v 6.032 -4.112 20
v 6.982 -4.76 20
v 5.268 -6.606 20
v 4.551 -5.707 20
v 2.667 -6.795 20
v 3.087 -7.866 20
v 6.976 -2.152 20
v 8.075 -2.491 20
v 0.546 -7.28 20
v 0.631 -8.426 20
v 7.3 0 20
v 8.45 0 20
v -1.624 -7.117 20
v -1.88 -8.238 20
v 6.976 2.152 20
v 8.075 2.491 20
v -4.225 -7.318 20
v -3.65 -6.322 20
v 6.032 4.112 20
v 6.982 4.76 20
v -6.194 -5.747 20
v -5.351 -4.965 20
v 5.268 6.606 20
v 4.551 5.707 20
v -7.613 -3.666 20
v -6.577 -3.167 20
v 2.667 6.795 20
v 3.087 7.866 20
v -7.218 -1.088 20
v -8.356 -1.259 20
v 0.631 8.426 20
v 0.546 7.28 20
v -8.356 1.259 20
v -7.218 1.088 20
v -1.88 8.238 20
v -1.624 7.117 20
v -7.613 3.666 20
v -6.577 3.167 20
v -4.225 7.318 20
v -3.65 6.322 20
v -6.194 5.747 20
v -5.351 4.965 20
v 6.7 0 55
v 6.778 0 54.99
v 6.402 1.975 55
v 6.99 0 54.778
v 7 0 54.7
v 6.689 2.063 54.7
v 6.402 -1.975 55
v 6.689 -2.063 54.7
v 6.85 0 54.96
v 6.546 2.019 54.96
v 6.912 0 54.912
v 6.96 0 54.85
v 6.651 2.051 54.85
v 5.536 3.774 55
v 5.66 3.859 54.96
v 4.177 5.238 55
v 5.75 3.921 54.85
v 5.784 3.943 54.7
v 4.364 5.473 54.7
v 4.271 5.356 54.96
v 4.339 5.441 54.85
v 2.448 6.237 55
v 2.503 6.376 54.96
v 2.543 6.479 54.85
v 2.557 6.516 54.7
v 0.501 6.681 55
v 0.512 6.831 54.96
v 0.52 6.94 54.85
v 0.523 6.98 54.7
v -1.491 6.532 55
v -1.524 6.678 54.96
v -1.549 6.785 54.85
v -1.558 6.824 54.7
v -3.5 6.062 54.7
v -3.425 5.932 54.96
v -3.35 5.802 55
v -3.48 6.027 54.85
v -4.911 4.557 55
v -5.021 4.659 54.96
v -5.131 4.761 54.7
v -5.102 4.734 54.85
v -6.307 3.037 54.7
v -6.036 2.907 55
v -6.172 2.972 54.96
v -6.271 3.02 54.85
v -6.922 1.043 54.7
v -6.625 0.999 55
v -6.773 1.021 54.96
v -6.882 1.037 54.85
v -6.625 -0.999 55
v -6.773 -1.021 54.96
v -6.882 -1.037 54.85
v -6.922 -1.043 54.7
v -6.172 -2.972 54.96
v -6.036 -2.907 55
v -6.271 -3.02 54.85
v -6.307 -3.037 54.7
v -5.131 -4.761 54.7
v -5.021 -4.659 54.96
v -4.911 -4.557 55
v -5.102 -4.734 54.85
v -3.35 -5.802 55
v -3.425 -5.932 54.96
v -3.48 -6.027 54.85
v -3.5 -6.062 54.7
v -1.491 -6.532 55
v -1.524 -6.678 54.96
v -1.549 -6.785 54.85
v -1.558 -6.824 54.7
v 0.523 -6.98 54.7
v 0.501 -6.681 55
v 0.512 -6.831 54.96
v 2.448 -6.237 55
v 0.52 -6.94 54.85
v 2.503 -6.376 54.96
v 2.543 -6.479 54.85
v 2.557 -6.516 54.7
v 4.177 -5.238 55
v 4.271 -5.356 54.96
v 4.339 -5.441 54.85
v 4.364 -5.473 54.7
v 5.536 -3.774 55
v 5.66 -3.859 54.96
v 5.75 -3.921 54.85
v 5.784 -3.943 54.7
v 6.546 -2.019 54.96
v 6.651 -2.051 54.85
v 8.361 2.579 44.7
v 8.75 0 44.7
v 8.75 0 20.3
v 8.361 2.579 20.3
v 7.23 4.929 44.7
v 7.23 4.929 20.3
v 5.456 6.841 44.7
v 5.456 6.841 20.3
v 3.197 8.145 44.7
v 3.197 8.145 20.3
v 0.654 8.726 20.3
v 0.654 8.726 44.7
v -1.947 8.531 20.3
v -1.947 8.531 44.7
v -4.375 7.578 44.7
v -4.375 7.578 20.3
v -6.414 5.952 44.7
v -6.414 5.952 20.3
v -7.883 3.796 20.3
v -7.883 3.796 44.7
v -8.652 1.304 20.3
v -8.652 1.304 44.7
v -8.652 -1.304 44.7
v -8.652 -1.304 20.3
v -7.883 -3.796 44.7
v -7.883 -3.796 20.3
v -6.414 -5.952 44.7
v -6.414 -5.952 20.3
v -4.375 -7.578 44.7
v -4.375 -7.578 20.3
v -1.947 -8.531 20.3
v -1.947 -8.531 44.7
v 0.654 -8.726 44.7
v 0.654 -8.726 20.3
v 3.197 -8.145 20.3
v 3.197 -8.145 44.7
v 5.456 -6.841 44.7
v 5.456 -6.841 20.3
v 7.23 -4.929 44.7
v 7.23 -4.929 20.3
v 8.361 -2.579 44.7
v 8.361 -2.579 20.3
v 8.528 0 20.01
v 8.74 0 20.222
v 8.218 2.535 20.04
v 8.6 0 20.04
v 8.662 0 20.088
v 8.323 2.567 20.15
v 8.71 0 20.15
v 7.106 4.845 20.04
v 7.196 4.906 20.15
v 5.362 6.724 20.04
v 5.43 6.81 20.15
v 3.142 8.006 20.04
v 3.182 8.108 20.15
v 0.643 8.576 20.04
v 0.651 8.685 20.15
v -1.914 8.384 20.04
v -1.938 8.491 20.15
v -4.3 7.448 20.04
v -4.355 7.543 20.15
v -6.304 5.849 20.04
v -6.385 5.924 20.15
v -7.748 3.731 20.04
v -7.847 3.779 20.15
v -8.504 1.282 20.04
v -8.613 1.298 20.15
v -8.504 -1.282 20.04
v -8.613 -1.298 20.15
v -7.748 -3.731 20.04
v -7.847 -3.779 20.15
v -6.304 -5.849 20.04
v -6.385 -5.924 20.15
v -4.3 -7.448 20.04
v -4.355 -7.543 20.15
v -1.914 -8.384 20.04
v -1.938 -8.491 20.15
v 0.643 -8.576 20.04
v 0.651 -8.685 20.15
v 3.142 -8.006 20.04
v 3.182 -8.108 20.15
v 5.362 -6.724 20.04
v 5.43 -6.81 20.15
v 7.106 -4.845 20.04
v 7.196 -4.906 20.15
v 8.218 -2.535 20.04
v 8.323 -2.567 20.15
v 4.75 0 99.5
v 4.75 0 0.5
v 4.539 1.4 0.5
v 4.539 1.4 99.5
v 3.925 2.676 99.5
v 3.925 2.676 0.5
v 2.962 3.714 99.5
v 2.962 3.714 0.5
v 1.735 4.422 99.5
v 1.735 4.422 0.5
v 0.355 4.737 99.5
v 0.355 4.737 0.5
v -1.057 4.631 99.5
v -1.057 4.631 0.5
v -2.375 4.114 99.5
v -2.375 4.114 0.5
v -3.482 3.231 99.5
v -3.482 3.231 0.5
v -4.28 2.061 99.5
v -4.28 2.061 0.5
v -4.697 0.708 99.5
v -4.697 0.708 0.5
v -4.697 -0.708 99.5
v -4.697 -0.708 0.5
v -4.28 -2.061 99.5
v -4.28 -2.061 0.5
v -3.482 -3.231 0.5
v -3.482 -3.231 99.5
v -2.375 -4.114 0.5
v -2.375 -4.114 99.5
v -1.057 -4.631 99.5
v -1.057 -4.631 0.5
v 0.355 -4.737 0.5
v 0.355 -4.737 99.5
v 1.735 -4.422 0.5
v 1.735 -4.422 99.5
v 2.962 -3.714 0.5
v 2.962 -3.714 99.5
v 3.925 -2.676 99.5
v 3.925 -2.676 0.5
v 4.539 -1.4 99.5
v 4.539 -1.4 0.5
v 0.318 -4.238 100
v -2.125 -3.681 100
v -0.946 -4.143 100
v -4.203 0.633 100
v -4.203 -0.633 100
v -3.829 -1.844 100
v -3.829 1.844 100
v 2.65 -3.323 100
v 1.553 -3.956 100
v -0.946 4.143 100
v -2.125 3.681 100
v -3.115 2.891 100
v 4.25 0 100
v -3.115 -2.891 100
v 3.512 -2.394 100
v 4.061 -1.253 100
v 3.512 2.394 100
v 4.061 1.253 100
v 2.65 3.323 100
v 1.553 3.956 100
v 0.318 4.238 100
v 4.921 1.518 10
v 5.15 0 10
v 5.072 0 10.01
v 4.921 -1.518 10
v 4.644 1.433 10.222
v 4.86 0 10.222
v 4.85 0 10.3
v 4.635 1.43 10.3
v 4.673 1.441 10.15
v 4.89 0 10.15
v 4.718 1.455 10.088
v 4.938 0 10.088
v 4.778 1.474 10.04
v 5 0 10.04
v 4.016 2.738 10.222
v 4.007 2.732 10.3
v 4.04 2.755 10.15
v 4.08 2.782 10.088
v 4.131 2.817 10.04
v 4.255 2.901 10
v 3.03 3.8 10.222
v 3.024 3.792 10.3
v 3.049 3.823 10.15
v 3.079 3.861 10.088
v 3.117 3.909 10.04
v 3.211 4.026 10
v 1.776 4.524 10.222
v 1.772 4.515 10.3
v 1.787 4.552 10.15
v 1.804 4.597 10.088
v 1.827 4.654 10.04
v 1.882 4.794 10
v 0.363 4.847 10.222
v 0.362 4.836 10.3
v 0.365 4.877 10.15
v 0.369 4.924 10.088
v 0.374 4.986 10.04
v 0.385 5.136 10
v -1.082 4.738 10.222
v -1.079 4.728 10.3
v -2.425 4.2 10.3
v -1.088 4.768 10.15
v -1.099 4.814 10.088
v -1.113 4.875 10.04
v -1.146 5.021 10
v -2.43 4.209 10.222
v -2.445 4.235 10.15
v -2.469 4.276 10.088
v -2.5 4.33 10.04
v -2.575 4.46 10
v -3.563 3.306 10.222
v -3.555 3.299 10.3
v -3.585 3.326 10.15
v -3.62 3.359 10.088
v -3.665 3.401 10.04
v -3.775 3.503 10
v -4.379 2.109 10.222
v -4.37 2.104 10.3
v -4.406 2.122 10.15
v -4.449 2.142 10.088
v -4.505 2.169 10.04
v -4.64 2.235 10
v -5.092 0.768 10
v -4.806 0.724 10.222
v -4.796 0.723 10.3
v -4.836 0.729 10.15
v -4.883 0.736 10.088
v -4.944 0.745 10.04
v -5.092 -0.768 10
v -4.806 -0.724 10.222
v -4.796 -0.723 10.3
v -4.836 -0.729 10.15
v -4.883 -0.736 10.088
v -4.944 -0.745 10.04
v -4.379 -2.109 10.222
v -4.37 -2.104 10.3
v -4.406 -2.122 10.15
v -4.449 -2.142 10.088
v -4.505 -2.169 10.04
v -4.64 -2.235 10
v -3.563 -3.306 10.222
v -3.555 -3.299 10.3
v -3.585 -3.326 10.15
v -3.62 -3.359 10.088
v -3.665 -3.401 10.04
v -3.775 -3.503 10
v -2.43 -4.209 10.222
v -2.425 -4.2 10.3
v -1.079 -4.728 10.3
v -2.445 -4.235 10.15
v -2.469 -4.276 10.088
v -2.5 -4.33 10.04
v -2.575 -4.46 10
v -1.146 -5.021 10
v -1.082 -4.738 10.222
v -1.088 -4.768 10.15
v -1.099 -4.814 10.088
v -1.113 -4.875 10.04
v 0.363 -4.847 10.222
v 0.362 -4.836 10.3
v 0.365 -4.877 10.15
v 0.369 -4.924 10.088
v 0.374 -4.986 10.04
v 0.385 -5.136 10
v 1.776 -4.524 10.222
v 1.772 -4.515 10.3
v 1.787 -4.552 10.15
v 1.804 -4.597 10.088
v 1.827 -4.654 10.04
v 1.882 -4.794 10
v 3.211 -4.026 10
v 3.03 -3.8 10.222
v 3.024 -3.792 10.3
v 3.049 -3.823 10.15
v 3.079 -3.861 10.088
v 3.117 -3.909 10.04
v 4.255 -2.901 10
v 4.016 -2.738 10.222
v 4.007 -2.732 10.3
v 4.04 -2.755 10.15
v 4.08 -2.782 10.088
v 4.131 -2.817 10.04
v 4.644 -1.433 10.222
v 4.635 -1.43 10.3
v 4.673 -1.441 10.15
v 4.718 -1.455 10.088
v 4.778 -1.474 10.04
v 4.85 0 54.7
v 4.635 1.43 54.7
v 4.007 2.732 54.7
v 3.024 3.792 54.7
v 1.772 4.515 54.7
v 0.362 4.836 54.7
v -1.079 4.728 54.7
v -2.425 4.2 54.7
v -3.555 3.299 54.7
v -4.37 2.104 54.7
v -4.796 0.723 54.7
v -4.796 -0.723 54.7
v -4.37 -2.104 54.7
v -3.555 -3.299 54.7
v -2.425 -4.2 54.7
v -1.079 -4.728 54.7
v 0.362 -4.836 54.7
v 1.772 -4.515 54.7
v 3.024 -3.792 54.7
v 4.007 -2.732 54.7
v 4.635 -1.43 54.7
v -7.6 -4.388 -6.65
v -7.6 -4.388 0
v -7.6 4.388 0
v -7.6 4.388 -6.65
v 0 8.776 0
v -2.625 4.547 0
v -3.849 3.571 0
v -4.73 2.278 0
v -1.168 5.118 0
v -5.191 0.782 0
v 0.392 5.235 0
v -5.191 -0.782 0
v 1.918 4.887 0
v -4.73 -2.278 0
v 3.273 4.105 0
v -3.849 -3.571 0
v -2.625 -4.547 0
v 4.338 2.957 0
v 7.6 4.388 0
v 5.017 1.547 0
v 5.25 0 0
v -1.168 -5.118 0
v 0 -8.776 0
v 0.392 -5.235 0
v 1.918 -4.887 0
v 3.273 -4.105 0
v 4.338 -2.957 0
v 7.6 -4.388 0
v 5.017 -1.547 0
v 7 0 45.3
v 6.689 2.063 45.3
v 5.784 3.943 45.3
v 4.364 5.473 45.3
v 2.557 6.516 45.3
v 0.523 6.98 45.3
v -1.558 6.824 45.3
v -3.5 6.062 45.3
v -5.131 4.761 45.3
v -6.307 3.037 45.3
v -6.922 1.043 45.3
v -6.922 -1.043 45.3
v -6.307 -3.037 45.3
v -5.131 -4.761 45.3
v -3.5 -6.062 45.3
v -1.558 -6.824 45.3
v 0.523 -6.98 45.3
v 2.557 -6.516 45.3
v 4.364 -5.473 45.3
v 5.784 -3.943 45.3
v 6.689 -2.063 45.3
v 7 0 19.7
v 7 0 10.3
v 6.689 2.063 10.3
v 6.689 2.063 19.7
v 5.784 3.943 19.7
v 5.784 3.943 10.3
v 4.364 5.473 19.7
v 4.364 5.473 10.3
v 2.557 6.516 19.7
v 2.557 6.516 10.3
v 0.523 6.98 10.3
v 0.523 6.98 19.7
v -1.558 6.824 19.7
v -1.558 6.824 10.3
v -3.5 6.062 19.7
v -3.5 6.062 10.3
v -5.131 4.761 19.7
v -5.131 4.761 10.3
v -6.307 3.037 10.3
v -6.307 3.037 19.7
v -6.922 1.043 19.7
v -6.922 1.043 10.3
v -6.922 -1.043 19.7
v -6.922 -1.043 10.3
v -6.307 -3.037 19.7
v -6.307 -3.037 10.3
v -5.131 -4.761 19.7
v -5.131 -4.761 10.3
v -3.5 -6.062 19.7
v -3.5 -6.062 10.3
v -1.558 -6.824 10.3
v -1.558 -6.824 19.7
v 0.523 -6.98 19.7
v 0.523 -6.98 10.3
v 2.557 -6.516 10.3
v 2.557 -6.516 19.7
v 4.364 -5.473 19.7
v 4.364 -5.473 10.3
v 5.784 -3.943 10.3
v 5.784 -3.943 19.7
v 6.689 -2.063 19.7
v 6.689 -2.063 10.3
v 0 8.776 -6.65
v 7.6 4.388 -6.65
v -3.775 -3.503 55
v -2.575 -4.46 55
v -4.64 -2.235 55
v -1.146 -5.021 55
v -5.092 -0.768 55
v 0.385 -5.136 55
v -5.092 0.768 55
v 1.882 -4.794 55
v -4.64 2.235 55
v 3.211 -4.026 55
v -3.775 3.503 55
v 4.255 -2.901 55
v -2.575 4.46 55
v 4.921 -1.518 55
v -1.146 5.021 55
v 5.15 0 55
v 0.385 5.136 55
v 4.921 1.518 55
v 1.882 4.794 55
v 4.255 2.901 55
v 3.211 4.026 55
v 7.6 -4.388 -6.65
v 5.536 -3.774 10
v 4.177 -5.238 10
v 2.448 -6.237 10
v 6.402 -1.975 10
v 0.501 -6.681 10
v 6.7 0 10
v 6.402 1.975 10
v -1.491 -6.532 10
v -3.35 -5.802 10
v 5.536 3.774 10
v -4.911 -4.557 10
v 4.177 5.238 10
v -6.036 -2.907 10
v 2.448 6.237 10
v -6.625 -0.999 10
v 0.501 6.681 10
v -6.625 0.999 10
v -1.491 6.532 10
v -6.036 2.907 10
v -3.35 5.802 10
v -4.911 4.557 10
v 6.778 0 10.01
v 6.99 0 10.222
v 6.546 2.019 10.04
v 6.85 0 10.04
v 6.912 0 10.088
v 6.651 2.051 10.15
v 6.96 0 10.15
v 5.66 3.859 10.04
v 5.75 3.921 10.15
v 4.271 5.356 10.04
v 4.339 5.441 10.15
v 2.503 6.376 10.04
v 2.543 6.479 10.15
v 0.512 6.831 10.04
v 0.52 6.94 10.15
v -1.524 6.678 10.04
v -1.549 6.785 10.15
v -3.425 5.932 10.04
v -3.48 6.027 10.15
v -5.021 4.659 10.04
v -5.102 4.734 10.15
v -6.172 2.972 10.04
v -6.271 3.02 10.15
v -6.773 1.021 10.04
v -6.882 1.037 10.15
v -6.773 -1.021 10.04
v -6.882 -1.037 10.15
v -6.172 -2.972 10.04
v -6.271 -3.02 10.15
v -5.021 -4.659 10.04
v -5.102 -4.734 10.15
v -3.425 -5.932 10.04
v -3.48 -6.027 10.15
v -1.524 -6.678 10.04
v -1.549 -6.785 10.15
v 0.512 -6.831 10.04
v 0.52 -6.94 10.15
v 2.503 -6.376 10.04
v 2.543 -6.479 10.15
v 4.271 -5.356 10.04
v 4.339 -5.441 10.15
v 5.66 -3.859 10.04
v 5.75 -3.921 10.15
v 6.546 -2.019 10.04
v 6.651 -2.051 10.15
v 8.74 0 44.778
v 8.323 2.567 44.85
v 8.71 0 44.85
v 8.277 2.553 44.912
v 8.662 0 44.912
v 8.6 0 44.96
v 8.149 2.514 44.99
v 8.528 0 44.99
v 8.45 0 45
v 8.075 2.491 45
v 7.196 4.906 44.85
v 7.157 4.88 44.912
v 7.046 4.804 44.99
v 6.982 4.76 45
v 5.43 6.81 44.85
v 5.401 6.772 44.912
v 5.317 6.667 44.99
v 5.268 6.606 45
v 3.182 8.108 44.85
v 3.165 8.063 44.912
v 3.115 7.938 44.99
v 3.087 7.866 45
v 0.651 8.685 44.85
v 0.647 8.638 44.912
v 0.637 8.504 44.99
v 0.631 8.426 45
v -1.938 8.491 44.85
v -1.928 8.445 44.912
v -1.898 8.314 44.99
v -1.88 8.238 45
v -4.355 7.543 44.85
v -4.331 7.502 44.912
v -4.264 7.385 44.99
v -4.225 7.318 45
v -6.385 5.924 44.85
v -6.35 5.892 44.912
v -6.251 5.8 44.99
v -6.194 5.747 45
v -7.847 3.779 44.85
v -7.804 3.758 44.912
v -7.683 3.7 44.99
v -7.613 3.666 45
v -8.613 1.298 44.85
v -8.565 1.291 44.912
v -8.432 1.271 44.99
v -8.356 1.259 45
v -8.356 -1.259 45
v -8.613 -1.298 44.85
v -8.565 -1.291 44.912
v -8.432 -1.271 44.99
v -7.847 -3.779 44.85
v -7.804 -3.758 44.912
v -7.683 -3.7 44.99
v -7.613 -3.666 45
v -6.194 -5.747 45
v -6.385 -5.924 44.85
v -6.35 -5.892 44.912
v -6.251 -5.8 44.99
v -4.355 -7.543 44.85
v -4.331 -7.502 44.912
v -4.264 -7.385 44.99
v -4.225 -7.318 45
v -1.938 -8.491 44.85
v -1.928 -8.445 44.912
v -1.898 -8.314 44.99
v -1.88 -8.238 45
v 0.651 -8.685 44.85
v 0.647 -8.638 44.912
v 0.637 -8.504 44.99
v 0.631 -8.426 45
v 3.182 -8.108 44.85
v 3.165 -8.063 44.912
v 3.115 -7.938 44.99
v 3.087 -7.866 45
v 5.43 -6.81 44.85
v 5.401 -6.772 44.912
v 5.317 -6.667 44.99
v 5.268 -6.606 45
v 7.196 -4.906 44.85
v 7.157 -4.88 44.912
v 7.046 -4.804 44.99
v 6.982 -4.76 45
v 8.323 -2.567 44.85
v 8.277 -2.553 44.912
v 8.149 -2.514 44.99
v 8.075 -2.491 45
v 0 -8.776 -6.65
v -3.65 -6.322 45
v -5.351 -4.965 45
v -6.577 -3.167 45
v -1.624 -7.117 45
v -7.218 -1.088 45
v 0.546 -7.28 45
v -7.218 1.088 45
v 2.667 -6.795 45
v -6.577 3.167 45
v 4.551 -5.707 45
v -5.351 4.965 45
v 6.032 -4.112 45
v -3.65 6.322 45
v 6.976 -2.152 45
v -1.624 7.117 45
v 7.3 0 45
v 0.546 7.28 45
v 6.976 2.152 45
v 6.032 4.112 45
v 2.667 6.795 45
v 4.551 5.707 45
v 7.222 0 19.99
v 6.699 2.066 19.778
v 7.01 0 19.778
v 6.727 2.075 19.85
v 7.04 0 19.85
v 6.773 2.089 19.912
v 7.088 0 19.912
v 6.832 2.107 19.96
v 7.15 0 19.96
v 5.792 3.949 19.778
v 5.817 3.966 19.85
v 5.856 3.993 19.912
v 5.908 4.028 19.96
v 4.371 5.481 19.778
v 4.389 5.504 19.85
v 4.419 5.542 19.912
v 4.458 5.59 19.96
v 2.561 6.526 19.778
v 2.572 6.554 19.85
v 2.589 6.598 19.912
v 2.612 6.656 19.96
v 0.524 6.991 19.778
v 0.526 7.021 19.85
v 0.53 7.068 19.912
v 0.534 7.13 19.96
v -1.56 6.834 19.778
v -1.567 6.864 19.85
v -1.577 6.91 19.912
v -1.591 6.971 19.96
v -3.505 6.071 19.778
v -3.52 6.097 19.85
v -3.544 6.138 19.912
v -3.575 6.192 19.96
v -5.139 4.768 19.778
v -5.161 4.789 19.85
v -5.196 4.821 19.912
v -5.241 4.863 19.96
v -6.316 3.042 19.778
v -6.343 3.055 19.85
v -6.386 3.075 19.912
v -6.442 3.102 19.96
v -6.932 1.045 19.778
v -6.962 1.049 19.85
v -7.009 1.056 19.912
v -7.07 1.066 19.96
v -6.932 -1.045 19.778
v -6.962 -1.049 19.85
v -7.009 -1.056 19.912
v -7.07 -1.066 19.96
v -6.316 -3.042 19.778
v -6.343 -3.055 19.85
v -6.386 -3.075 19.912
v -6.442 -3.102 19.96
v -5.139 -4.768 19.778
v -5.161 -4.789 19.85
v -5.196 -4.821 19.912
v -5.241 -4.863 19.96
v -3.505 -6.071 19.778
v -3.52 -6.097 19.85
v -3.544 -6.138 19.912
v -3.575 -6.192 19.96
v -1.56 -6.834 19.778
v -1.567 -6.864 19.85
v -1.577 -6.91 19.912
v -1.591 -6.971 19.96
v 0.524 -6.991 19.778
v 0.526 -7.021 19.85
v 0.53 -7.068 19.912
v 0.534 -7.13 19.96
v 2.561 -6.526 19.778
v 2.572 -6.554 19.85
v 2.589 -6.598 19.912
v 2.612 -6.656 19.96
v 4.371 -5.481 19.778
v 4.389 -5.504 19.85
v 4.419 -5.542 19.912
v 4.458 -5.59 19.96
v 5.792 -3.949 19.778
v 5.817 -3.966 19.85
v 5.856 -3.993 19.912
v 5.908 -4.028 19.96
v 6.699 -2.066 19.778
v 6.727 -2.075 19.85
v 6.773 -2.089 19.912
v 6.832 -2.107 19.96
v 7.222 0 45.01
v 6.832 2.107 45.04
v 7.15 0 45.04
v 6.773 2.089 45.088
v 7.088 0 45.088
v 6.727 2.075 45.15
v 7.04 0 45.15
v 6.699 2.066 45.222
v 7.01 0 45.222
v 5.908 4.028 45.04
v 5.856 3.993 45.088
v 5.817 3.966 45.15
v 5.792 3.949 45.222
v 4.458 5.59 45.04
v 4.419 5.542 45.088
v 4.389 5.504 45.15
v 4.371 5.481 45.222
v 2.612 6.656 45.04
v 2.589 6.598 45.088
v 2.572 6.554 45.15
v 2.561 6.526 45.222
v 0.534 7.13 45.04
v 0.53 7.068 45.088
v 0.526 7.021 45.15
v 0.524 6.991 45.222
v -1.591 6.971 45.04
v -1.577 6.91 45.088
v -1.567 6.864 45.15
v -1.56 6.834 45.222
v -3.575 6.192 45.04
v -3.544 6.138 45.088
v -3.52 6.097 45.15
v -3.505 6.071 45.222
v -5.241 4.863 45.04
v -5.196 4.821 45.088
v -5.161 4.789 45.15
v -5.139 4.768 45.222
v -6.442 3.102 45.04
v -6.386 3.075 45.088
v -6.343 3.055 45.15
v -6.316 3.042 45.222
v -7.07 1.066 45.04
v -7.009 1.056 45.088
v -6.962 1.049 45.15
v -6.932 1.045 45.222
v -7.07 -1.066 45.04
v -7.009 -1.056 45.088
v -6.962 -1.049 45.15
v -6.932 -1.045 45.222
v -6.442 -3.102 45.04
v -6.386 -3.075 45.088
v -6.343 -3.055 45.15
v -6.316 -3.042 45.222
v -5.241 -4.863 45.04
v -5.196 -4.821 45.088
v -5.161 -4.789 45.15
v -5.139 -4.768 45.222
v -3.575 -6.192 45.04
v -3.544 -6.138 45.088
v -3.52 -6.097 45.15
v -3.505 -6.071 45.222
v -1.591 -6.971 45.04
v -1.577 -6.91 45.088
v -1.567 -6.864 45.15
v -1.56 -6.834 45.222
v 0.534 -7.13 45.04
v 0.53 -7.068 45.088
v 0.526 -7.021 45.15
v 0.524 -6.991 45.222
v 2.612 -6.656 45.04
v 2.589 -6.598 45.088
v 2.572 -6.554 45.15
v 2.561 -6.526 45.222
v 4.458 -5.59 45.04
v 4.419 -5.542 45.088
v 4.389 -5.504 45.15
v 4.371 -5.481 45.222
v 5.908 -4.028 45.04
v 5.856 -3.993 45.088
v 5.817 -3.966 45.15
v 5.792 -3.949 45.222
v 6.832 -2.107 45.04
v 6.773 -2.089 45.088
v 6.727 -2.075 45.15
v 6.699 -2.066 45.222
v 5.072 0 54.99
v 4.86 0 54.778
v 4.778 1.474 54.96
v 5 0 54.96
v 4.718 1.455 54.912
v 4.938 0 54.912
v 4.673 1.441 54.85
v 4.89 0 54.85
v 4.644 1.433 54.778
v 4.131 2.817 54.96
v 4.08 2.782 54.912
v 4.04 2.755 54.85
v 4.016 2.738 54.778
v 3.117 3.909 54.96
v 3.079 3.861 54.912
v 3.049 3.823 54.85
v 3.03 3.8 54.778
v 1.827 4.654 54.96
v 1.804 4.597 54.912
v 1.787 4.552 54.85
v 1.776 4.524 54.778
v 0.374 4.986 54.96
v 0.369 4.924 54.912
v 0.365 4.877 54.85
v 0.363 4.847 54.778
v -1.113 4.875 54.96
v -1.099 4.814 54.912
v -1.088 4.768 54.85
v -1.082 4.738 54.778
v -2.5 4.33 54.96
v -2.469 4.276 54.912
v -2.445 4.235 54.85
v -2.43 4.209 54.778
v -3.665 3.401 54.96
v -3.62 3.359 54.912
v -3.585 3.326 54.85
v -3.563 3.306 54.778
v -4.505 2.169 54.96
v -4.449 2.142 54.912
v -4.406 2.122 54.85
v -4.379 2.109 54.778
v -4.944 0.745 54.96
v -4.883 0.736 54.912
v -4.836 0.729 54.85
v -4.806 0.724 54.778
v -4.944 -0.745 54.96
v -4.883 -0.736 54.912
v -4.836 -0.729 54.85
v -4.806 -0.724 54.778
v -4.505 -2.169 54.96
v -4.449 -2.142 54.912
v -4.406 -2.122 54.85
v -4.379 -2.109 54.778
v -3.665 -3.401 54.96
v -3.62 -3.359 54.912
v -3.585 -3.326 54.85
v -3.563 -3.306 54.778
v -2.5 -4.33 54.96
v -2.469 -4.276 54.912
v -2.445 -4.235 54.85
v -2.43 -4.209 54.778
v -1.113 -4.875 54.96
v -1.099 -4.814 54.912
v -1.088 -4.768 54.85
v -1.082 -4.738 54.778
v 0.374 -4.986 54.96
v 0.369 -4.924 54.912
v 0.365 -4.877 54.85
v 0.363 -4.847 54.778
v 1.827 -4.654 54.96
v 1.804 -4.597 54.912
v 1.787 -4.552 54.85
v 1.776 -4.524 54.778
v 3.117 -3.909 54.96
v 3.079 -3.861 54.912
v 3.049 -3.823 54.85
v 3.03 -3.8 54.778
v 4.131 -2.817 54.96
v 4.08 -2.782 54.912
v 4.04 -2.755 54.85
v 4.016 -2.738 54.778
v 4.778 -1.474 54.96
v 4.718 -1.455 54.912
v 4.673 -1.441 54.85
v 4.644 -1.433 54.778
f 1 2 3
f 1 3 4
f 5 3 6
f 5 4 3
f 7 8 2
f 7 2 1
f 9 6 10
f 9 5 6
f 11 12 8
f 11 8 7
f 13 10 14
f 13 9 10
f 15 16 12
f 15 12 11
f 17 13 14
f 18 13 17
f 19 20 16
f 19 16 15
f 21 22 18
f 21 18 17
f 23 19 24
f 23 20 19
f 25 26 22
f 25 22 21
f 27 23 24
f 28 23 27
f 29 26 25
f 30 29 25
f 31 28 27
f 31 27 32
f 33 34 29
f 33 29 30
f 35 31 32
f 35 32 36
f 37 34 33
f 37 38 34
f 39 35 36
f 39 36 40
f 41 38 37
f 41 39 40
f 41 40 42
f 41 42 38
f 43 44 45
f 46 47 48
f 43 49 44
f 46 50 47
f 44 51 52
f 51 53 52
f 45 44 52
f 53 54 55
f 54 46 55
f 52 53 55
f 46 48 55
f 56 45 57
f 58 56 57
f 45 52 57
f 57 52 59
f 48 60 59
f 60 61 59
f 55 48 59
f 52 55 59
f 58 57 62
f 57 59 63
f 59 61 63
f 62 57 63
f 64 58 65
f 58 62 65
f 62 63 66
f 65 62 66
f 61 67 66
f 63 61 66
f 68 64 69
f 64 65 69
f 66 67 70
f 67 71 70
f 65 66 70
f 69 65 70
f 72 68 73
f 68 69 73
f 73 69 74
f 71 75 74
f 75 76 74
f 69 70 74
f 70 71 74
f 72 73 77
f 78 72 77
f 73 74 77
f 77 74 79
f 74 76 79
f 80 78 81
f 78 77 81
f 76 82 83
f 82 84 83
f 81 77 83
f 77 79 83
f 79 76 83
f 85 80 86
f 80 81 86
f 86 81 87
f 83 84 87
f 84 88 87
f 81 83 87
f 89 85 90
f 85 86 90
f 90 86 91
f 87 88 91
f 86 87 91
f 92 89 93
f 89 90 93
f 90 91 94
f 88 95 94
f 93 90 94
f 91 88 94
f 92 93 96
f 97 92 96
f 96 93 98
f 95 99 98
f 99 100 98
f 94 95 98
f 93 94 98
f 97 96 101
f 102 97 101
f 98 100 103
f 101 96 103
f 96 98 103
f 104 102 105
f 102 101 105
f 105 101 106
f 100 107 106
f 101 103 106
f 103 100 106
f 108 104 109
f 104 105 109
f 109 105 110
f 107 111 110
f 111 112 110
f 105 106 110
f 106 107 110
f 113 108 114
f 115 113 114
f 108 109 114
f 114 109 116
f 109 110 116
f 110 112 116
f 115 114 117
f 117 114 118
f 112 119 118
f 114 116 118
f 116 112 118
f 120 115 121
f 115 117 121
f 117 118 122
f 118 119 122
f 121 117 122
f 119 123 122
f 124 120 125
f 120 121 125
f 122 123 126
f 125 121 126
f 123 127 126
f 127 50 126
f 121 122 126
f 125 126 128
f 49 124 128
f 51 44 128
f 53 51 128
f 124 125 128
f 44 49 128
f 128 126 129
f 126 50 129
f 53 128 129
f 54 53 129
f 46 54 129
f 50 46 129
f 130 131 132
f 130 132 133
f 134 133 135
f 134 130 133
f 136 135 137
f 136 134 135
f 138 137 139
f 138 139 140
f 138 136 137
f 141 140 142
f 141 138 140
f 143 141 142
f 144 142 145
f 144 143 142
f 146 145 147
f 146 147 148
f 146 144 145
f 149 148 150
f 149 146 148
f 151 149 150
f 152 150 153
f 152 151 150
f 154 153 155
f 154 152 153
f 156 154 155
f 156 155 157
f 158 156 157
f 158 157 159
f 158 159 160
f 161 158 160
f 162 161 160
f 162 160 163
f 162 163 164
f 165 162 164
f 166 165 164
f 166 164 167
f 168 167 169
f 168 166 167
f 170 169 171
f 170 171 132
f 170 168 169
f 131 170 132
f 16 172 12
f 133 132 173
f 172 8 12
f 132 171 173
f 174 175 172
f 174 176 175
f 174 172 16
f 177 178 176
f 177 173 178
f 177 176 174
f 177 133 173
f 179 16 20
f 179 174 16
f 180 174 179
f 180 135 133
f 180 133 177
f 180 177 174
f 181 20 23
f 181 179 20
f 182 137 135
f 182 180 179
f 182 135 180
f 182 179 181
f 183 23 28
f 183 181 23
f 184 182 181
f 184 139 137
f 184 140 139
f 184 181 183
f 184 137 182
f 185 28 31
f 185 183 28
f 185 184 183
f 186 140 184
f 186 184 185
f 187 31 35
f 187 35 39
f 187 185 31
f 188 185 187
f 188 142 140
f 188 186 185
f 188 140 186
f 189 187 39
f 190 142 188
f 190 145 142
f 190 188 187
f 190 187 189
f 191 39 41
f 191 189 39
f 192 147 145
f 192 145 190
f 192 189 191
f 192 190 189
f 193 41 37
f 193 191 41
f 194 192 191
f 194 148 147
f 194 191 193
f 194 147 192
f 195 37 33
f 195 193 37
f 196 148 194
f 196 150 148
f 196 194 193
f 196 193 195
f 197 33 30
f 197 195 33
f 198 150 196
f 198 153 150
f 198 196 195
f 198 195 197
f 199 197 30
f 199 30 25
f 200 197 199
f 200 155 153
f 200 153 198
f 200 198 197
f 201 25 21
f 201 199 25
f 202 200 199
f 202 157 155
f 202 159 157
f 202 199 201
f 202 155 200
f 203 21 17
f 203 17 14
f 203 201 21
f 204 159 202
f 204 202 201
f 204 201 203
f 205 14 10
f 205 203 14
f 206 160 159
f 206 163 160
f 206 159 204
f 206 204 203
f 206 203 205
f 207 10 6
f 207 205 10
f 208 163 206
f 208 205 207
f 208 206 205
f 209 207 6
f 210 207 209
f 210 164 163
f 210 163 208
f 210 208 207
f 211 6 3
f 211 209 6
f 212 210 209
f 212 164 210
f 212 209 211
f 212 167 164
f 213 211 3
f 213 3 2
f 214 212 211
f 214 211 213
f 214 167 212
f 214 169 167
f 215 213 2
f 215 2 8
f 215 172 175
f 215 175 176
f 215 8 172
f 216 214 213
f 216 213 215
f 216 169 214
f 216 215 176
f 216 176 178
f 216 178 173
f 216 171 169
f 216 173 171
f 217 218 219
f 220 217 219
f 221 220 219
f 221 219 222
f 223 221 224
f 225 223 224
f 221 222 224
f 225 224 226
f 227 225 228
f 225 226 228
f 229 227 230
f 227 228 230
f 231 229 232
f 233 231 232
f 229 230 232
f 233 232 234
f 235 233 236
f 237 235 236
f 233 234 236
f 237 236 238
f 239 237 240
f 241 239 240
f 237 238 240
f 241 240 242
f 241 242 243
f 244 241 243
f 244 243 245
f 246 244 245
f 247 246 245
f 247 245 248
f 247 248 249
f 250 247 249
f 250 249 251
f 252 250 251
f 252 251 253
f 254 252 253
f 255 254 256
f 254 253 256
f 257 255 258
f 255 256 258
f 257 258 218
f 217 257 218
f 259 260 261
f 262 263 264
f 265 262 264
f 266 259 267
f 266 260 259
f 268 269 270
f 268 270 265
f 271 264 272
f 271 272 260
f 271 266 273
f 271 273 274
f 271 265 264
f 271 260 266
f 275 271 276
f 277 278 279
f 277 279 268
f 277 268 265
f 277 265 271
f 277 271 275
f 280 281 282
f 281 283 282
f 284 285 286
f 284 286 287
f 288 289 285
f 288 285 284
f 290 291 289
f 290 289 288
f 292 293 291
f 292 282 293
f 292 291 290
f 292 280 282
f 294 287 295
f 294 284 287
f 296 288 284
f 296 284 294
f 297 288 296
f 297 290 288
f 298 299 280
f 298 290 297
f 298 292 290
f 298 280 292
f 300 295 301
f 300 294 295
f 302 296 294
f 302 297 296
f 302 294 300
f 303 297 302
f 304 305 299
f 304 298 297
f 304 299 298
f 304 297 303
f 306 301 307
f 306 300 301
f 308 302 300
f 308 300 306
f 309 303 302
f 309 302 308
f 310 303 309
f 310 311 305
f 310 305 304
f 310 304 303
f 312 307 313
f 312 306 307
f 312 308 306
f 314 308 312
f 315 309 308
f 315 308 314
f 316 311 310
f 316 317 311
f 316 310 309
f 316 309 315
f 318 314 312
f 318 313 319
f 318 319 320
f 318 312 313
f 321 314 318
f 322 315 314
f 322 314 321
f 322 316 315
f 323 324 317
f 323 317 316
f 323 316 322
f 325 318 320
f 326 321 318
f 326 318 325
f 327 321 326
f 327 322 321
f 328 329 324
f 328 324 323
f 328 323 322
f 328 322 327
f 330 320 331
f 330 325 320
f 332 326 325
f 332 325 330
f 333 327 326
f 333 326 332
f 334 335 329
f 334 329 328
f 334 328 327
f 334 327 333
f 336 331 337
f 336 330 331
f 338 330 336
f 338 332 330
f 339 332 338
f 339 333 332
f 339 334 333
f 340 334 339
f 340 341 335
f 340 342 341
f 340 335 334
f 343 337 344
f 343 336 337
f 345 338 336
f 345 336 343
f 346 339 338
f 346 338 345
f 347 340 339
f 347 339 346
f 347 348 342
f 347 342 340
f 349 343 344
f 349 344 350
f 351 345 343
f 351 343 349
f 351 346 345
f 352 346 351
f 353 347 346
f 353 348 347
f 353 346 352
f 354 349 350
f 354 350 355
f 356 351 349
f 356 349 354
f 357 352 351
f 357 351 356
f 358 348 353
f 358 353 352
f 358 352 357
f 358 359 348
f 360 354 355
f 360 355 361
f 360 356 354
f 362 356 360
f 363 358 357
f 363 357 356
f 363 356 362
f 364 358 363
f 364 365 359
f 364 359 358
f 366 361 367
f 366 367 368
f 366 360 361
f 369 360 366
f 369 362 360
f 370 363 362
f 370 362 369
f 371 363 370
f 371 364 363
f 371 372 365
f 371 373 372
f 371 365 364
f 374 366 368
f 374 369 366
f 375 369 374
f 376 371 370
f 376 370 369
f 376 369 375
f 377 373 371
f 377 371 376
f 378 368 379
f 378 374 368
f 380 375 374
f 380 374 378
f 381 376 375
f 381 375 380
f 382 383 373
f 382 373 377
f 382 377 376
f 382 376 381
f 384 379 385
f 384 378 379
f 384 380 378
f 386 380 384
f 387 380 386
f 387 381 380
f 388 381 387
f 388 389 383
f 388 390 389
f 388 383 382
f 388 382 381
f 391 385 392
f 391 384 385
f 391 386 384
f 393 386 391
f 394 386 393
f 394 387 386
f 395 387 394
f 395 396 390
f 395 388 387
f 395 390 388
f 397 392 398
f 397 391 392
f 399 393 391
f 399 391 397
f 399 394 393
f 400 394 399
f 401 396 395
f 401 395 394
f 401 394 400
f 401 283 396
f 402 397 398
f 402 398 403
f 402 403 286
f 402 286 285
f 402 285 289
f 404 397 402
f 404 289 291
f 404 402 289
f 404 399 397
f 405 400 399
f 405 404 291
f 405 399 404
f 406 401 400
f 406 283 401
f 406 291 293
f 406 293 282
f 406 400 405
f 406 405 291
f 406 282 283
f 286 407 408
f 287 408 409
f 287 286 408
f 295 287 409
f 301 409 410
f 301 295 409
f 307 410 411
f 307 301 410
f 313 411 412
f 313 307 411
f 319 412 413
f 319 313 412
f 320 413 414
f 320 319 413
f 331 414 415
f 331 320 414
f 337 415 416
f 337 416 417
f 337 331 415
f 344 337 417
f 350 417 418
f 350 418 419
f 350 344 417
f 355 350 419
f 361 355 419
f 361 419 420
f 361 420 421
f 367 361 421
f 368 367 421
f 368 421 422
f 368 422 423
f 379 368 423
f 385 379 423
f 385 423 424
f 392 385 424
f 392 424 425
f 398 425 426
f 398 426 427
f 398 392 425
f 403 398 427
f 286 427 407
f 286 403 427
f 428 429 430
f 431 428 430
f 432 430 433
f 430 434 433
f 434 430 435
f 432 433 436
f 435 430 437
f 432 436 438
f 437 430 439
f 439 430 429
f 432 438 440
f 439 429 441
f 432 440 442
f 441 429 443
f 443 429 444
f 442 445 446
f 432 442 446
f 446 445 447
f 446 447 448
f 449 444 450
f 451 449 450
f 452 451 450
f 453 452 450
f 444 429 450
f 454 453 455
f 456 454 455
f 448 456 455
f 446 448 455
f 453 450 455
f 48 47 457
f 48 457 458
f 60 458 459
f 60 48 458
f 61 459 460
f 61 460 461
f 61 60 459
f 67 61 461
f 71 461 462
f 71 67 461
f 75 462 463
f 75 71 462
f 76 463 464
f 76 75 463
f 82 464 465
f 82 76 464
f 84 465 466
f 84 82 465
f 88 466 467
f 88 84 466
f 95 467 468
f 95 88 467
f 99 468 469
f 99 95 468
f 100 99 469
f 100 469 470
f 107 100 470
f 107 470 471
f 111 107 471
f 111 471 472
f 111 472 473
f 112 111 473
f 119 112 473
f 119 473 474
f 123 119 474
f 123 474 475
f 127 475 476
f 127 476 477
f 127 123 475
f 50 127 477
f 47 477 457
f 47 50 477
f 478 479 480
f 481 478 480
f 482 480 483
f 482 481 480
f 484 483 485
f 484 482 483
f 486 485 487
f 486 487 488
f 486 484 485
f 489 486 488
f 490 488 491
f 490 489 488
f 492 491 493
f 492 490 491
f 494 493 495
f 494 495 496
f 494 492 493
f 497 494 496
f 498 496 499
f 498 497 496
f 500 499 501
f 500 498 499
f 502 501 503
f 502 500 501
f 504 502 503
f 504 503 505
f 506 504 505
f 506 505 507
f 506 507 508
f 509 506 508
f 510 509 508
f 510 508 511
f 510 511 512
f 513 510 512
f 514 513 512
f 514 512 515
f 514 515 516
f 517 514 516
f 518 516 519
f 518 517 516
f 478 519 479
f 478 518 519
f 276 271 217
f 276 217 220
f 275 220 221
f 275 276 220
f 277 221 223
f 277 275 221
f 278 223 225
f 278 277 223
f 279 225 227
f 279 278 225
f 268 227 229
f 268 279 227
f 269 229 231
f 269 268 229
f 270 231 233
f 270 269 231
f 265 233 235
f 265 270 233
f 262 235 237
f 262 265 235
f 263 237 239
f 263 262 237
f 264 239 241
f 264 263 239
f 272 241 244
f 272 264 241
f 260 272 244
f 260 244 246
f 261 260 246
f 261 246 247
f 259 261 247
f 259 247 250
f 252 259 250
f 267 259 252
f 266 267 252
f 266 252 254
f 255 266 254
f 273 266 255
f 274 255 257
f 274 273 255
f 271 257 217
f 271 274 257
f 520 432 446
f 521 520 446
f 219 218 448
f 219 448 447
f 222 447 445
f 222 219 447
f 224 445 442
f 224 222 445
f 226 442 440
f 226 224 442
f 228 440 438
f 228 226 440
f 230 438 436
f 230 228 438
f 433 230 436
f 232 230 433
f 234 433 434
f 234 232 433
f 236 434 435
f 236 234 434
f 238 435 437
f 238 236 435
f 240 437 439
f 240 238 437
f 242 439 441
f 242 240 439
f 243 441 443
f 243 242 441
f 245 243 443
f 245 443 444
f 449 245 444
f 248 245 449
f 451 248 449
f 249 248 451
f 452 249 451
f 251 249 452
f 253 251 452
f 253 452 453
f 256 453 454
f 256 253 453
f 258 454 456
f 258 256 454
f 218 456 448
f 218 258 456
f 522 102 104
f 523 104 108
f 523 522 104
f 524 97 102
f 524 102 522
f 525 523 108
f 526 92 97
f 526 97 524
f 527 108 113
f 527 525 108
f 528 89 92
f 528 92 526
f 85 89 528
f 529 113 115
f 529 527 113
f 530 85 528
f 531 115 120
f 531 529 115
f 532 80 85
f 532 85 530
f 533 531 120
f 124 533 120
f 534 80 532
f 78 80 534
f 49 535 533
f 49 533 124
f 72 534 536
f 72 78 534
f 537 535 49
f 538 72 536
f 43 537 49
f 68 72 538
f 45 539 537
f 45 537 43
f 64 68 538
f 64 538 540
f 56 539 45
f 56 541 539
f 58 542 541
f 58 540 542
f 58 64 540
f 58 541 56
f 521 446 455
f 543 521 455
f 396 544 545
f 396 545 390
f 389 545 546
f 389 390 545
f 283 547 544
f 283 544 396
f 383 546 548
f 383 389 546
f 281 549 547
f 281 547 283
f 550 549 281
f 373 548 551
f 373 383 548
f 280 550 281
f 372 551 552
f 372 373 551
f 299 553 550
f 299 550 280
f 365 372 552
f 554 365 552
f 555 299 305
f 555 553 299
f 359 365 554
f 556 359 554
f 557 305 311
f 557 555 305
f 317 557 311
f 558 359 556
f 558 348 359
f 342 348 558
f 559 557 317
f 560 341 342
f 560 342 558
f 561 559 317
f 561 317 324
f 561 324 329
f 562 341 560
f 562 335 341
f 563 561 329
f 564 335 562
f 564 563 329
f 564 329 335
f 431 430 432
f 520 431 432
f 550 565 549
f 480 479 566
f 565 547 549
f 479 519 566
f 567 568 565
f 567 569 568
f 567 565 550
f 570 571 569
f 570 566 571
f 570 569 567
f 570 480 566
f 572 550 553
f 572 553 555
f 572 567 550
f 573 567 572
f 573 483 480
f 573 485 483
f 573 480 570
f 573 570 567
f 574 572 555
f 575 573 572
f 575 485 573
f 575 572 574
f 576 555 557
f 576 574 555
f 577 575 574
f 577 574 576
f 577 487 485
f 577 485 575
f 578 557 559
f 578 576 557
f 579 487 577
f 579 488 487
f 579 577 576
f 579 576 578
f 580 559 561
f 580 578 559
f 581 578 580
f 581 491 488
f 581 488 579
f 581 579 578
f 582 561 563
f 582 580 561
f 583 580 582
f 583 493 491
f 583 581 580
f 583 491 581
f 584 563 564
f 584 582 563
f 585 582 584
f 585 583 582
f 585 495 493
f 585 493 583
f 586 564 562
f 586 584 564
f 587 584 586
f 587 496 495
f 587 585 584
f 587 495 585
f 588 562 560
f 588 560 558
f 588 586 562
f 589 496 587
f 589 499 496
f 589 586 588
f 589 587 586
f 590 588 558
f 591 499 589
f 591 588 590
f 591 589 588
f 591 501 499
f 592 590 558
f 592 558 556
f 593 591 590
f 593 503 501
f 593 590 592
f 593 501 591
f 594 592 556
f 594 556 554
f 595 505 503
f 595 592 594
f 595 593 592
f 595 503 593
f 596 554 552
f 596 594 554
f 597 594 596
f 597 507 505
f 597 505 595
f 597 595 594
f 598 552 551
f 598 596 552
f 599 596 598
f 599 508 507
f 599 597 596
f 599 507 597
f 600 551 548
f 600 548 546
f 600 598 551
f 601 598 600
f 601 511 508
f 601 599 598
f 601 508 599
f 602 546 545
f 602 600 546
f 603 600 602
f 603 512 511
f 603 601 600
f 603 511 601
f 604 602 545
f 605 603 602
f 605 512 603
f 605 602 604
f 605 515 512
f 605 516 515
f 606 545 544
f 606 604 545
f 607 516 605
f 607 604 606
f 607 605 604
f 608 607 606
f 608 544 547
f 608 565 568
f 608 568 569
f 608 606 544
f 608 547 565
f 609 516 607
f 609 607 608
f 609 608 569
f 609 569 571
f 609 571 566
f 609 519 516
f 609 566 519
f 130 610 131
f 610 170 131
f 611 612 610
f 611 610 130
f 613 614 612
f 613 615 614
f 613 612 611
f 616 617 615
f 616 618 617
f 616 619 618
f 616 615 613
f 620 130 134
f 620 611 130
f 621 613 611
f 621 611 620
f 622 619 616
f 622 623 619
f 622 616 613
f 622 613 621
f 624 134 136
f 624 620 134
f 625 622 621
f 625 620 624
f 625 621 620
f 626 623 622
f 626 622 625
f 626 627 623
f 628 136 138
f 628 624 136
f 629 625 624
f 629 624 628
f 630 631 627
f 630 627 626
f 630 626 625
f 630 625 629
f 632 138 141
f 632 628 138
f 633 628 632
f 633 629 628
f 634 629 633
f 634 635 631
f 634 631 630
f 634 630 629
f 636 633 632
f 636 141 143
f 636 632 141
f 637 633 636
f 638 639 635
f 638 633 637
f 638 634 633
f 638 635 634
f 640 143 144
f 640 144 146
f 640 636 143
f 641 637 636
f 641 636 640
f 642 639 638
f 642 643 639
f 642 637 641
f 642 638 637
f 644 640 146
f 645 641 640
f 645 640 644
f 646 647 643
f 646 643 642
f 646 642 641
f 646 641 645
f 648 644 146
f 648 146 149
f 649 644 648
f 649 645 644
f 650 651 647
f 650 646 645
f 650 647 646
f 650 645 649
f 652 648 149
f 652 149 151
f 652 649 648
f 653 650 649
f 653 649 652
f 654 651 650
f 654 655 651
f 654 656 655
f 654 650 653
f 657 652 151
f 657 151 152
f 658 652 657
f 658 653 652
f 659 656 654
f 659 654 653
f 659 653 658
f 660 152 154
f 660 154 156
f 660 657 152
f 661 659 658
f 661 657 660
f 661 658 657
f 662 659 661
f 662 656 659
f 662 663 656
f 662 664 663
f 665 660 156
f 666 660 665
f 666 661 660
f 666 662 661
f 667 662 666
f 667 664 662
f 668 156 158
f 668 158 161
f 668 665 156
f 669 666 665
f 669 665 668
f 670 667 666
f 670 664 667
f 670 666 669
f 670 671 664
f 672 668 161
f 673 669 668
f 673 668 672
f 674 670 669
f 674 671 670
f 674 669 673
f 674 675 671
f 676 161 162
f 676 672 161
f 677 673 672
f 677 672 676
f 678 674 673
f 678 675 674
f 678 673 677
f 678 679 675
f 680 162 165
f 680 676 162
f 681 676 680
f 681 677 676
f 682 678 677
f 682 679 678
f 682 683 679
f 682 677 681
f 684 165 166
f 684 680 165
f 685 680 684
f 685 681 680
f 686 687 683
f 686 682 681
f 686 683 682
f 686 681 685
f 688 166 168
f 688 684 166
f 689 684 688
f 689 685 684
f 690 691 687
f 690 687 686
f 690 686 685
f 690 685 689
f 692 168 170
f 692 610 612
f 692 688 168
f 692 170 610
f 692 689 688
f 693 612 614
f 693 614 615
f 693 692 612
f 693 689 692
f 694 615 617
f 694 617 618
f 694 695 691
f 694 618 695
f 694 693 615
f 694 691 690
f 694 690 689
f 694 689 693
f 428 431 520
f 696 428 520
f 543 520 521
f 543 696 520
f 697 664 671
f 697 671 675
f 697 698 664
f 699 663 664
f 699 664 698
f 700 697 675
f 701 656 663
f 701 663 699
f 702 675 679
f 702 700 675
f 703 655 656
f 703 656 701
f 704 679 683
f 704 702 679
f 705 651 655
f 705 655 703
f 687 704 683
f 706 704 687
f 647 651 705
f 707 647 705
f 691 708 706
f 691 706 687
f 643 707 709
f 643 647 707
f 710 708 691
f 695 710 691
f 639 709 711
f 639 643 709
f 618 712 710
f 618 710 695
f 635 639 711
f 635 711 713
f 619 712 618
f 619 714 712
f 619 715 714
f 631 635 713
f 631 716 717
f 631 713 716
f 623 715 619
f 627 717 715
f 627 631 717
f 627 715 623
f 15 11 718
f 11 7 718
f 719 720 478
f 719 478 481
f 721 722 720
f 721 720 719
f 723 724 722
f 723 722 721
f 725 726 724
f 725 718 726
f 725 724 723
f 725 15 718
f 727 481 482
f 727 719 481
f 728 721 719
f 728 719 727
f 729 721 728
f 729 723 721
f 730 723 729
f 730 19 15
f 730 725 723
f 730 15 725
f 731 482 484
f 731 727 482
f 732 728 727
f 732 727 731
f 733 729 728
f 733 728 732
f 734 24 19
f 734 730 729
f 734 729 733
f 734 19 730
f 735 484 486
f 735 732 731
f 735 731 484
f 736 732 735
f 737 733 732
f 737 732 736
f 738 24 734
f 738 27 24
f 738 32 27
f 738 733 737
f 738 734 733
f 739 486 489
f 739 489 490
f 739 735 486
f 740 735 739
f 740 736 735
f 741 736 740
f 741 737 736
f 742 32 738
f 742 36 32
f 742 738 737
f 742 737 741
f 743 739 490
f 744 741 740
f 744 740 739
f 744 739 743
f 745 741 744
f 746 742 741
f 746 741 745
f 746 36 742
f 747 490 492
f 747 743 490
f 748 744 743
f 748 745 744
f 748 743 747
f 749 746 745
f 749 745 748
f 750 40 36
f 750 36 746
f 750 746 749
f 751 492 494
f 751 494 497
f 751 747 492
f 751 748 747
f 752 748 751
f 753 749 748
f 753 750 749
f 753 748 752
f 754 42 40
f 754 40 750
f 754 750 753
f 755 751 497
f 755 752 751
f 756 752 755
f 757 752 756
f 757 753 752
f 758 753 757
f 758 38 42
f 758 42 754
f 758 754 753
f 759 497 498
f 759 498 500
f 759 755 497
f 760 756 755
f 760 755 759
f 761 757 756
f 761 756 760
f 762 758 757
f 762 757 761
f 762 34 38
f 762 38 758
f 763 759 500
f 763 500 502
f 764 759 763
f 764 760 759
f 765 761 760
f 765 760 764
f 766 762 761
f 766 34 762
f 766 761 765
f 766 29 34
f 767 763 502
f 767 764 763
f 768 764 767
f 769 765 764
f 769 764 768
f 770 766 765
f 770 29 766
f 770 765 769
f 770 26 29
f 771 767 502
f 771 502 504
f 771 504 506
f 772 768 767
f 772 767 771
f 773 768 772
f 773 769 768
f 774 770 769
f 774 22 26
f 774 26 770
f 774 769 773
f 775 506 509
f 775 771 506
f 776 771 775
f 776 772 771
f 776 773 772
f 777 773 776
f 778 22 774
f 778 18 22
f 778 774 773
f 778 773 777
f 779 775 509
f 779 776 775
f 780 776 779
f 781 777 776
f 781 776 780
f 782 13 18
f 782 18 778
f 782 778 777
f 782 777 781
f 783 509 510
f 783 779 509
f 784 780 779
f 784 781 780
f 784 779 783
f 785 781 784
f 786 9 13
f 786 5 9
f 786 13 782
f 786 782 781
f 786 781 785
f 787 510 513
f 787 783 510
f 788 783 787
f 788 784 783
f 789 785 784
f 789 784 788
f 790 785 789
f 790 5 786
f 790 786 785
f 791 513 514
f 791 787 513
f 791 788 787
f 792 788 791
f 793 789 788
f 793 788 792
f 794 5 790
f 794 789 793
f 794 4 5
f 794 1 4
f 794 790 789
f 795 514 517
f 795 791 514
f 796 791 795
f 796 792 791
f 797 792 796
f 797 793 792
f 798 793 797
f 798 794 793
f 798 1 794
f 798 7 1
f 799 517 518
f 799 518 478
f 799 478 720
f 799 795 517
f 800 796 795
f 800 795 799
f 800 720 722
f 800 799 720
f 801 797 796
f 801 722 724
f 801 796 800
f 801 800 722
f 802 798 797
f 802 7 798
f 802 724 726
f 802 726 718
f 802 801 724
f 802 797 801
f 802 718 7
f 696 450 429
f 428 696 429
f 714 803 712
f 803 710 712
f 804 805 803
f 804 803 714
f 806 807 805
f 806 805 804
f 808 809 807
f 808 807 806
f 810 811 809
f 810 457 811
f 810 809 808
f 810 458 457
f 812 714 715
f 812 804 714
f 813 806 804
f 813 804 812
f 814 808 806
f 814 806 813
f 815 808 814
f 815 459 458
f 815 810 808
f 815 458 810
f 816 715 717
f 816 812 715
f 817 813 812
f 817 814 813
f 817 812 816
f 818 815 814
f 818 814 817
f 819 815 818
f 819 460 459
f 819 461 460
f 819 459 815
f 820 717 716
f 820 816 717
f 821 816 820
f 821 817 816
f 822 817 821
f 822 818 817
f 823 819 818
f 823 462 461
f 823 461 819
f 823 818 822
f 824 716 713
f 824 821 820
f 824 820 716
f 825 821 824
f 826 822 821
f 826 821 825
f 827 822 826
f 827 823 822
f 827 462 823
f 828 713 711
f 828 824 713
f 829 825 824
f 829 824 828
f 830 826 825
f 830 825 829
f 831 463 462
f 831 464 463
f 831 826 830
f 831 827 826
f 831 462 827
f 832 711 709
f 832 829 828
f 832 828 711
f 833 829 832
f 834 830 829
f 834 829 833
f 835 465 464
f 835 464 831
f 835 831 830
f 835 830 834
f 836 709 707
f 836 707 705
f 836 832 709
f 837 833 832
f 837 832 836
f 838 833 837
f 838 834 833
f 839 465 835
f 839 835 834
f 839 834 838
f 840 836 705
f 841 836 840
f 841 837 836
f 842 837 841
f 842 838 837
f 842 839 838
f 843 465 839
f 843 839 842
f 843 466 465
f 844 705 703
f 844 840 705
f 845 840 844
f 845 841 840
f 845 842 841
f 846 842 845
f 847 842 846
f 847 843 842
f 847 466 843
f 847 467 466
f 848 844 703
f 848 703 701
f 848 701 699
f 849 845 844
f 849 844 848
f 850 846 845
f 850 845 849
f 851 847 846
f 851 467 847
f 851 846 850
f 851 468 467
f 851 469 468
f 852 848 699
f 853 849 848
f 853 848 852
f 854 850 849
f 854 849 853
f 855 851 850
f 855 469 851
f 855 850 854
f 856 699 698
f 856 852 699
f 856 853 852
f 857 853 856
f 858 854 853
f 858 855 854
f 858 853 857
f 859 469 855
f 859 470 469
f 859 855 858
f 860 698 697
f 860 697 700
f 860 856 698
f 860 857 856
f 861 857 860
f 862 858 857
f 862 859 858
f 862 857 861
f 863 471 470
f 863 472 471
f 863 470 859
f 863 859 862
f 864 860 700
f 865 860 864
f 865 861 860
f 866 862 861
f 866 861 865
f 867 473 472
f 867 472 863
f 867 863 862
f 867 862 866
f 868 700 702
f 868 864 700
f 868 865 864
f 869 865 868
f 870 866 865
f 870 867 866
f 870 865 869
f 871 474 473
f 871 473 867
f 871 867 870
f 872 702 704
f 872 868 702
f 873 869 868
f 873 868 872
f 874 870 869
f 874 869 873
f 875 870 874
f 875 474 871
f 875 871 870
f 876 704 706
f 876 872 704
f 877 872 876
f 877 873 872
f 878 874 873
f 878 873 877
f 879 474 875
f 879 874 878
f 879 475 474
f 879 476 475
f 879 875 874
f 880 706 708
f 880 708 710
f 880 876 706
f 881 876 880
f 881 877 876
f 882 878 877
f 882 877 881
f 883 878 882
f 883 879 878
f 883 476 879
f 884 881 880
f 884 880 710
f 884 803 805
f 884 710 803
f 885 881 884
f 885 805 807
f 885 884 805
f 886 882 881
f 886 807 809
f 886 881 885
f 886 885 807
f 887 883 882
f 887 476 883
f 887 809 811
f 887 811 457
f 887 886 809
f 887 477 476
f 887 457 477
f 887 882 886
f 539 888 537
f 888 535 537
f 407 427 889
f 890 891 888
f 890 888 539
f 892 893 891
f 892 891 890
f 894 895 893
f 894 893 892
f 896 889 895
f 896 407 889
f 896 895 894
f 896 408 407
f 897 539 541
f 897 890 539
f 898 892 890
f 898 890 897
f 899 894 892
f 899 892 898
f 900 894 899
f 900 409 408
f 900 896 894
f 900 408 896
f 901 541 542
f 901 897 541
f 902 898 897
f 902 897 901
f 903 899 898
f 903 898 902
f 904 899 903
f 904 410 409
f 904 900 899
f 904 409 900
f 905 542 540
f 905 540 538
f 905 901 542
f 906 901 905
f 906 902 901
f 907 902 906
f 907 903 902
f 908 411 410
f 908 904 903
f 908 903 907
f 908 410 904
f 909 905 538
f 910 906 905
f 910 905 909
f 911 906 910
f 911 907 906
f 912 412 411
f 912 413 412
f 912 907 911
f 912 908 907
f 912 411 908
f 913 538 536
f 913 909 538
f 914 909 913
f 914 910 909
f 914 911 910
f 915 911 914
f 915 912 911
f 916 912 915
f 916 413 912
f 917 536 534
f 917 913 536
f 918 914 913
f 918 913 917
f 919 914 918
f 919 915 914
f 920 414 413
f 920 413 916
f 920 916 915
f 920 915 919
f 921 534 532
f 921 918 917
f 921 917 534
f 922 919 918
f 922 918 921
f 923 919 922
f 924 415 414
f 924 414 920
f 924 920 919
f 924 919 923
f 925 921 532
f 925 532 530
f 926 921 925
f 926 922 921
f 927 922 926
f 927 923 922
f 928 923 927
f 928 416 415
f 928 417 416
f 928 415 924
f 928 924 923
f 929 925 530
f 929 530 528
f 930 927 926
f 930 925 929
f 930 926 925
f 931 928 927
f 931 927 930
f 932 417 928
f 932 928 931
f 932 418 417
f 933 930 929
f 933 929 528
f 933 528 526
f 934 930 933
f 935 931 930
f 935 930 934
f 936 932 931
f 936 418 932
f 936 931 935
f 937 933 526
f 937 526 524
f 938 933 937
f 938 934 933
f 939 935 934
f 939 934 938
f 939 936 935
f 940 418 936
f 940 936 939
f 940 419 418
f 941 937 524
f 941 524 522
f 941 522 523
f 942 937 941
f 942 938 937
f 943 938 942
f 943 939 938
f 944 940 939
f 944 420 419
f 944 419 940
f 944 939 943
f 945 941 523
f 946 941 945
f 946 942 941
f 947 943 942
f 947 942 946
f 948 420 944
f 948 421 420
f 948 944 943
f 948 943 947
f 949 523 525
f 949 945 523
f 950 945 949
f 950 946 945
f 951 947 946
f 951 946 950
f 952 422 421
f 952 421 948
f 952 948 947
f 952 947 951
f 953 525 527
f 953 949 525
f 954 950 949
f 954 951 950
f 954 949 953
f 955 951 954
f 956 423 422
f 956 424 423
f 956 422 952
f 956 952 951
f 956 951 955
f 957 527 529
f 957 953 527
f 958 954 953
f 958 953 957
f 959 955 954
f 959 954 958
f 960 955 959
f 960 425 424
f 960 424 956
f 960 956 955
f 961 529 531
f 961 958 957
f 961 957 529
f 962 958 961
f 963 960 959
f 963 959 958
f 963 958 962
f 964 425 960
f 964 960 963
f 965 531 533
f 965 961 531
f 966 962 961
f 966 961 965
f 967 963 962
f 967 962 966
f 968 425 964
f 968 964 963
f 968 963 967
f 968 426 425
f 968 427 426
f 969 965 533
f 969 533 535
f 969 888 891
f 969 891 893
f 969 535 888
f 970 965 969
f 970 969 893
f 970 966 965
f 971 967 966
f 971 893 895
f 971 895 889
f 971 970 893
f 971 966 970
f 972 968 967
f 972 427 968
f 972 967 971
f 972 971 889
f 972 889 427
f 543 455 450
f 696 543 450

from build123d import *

# Parameters (mm, degrees)
F0_R     = 4.75
F1_DEPTH = 100
F3_DEPTH = 6.65
F4_SIZE  = 0.5
F7_R     = 0.3


with BuildPart() as f1:
    # F0 (on Top) → F1 (new body)
    with BuildSketch(Plane.XY):
        Circle(F0_R)
    extrude(amount=F1_DEPTH)

    # F2 (on face) → F3 (join)
    with BuildSketch(Plane(origin=(0, 0, 0), x_dir=(1, 0, 0), z_dir=(0, 0, -1))):
        Polygon((7.6, -4.387862), (7.6, 4.387862), (0, 8.775724), (-7.6, 4.387862), (-7.6, -4.387862), (0, -8.775724), align=None)
    extrude(amount=F3_DEPTH)

    # F4
    f4_edges = [f1.edges().sort_by_distance(p)[0] for p in [
        (-4.75, 0, 100),
        (-4.75, 0, 0),
    ]]
    chamfer(f4_edges, length=F4_SIZE)


with BuildPart() as f6:
    # F5 (on Front) → F6 (revolve)
    with BuildSketch(Plane.XZ):
        Polygon((7, 55), (4.85, 55), (4.85, 10), (7, 10), (7, 20), (8.75, 20), (8.75, 45), (7, 45), align=None)
    revolve(axis=Axis((0, 0, 20.679142), (0, 0, 1)))

    # F7
    f7_edges = [f6.edges().sort_by_distance(p)[0] for p in [
        (-7, 0, 10),
        (-7, 0, 20),
        (-8.75, 0, 20),
        (-8.75, 0, 45),
        (-7, 0, 45),
        (-7, 0, 55),
        (-4.85, 0, 55),
        (-4.85, 0, 10),
    ]]
    fillet(f7_edges, radius=F7_R)


solid = Compound([f1.part, f6.part])
